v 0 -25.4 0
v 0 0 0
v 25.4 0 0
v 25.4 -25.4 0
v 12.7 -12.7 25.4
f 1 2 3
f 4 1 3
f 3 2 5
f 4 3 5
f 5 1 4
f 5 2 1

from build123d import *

# Parameters (mm, degrees)
F0_W     = 25.4
F0_H     = 25.4
F1_DEPTH = 25.4
F2_SIZE2 = 25.39999
F2_SIZE  = 12.69999


# Not quite as in the source:
# - a fillet or chamfer is up to 0.001 mm smaller than in the source, because OpenCascade refuses the exact size


with BuildPart() as f1:
    # F0 (on Front) → F1 (new body)
    with BuildSketch(Plane.XZ):
        with Locations((12.7, 12.7)):
            Rectangle(F0_W, F0_H)
    extrude(amount=F1_DEPTH)

    # F2 (size 12.7 and 25.4 in the source; OpenCascade refuses exactly that, so slightly less here)
    f2_edges = [f1.edges().sort_by_distance(p)[0] for p in [
        (25.4, -12.7, 25.4),
        (0, -12.7, 25.4),
        (12.7, 0, 25.4),
        (12.7, -25.4, 25.4),
    ]]
    f2_side = f1.faces().sort_by_distance((12.7, -12.7, 25.4))[0]
    chamfer(f2_edges, length=F2_SIZE, length2=F2_SIZE2, reference=f2_side)


solid = f1.part
